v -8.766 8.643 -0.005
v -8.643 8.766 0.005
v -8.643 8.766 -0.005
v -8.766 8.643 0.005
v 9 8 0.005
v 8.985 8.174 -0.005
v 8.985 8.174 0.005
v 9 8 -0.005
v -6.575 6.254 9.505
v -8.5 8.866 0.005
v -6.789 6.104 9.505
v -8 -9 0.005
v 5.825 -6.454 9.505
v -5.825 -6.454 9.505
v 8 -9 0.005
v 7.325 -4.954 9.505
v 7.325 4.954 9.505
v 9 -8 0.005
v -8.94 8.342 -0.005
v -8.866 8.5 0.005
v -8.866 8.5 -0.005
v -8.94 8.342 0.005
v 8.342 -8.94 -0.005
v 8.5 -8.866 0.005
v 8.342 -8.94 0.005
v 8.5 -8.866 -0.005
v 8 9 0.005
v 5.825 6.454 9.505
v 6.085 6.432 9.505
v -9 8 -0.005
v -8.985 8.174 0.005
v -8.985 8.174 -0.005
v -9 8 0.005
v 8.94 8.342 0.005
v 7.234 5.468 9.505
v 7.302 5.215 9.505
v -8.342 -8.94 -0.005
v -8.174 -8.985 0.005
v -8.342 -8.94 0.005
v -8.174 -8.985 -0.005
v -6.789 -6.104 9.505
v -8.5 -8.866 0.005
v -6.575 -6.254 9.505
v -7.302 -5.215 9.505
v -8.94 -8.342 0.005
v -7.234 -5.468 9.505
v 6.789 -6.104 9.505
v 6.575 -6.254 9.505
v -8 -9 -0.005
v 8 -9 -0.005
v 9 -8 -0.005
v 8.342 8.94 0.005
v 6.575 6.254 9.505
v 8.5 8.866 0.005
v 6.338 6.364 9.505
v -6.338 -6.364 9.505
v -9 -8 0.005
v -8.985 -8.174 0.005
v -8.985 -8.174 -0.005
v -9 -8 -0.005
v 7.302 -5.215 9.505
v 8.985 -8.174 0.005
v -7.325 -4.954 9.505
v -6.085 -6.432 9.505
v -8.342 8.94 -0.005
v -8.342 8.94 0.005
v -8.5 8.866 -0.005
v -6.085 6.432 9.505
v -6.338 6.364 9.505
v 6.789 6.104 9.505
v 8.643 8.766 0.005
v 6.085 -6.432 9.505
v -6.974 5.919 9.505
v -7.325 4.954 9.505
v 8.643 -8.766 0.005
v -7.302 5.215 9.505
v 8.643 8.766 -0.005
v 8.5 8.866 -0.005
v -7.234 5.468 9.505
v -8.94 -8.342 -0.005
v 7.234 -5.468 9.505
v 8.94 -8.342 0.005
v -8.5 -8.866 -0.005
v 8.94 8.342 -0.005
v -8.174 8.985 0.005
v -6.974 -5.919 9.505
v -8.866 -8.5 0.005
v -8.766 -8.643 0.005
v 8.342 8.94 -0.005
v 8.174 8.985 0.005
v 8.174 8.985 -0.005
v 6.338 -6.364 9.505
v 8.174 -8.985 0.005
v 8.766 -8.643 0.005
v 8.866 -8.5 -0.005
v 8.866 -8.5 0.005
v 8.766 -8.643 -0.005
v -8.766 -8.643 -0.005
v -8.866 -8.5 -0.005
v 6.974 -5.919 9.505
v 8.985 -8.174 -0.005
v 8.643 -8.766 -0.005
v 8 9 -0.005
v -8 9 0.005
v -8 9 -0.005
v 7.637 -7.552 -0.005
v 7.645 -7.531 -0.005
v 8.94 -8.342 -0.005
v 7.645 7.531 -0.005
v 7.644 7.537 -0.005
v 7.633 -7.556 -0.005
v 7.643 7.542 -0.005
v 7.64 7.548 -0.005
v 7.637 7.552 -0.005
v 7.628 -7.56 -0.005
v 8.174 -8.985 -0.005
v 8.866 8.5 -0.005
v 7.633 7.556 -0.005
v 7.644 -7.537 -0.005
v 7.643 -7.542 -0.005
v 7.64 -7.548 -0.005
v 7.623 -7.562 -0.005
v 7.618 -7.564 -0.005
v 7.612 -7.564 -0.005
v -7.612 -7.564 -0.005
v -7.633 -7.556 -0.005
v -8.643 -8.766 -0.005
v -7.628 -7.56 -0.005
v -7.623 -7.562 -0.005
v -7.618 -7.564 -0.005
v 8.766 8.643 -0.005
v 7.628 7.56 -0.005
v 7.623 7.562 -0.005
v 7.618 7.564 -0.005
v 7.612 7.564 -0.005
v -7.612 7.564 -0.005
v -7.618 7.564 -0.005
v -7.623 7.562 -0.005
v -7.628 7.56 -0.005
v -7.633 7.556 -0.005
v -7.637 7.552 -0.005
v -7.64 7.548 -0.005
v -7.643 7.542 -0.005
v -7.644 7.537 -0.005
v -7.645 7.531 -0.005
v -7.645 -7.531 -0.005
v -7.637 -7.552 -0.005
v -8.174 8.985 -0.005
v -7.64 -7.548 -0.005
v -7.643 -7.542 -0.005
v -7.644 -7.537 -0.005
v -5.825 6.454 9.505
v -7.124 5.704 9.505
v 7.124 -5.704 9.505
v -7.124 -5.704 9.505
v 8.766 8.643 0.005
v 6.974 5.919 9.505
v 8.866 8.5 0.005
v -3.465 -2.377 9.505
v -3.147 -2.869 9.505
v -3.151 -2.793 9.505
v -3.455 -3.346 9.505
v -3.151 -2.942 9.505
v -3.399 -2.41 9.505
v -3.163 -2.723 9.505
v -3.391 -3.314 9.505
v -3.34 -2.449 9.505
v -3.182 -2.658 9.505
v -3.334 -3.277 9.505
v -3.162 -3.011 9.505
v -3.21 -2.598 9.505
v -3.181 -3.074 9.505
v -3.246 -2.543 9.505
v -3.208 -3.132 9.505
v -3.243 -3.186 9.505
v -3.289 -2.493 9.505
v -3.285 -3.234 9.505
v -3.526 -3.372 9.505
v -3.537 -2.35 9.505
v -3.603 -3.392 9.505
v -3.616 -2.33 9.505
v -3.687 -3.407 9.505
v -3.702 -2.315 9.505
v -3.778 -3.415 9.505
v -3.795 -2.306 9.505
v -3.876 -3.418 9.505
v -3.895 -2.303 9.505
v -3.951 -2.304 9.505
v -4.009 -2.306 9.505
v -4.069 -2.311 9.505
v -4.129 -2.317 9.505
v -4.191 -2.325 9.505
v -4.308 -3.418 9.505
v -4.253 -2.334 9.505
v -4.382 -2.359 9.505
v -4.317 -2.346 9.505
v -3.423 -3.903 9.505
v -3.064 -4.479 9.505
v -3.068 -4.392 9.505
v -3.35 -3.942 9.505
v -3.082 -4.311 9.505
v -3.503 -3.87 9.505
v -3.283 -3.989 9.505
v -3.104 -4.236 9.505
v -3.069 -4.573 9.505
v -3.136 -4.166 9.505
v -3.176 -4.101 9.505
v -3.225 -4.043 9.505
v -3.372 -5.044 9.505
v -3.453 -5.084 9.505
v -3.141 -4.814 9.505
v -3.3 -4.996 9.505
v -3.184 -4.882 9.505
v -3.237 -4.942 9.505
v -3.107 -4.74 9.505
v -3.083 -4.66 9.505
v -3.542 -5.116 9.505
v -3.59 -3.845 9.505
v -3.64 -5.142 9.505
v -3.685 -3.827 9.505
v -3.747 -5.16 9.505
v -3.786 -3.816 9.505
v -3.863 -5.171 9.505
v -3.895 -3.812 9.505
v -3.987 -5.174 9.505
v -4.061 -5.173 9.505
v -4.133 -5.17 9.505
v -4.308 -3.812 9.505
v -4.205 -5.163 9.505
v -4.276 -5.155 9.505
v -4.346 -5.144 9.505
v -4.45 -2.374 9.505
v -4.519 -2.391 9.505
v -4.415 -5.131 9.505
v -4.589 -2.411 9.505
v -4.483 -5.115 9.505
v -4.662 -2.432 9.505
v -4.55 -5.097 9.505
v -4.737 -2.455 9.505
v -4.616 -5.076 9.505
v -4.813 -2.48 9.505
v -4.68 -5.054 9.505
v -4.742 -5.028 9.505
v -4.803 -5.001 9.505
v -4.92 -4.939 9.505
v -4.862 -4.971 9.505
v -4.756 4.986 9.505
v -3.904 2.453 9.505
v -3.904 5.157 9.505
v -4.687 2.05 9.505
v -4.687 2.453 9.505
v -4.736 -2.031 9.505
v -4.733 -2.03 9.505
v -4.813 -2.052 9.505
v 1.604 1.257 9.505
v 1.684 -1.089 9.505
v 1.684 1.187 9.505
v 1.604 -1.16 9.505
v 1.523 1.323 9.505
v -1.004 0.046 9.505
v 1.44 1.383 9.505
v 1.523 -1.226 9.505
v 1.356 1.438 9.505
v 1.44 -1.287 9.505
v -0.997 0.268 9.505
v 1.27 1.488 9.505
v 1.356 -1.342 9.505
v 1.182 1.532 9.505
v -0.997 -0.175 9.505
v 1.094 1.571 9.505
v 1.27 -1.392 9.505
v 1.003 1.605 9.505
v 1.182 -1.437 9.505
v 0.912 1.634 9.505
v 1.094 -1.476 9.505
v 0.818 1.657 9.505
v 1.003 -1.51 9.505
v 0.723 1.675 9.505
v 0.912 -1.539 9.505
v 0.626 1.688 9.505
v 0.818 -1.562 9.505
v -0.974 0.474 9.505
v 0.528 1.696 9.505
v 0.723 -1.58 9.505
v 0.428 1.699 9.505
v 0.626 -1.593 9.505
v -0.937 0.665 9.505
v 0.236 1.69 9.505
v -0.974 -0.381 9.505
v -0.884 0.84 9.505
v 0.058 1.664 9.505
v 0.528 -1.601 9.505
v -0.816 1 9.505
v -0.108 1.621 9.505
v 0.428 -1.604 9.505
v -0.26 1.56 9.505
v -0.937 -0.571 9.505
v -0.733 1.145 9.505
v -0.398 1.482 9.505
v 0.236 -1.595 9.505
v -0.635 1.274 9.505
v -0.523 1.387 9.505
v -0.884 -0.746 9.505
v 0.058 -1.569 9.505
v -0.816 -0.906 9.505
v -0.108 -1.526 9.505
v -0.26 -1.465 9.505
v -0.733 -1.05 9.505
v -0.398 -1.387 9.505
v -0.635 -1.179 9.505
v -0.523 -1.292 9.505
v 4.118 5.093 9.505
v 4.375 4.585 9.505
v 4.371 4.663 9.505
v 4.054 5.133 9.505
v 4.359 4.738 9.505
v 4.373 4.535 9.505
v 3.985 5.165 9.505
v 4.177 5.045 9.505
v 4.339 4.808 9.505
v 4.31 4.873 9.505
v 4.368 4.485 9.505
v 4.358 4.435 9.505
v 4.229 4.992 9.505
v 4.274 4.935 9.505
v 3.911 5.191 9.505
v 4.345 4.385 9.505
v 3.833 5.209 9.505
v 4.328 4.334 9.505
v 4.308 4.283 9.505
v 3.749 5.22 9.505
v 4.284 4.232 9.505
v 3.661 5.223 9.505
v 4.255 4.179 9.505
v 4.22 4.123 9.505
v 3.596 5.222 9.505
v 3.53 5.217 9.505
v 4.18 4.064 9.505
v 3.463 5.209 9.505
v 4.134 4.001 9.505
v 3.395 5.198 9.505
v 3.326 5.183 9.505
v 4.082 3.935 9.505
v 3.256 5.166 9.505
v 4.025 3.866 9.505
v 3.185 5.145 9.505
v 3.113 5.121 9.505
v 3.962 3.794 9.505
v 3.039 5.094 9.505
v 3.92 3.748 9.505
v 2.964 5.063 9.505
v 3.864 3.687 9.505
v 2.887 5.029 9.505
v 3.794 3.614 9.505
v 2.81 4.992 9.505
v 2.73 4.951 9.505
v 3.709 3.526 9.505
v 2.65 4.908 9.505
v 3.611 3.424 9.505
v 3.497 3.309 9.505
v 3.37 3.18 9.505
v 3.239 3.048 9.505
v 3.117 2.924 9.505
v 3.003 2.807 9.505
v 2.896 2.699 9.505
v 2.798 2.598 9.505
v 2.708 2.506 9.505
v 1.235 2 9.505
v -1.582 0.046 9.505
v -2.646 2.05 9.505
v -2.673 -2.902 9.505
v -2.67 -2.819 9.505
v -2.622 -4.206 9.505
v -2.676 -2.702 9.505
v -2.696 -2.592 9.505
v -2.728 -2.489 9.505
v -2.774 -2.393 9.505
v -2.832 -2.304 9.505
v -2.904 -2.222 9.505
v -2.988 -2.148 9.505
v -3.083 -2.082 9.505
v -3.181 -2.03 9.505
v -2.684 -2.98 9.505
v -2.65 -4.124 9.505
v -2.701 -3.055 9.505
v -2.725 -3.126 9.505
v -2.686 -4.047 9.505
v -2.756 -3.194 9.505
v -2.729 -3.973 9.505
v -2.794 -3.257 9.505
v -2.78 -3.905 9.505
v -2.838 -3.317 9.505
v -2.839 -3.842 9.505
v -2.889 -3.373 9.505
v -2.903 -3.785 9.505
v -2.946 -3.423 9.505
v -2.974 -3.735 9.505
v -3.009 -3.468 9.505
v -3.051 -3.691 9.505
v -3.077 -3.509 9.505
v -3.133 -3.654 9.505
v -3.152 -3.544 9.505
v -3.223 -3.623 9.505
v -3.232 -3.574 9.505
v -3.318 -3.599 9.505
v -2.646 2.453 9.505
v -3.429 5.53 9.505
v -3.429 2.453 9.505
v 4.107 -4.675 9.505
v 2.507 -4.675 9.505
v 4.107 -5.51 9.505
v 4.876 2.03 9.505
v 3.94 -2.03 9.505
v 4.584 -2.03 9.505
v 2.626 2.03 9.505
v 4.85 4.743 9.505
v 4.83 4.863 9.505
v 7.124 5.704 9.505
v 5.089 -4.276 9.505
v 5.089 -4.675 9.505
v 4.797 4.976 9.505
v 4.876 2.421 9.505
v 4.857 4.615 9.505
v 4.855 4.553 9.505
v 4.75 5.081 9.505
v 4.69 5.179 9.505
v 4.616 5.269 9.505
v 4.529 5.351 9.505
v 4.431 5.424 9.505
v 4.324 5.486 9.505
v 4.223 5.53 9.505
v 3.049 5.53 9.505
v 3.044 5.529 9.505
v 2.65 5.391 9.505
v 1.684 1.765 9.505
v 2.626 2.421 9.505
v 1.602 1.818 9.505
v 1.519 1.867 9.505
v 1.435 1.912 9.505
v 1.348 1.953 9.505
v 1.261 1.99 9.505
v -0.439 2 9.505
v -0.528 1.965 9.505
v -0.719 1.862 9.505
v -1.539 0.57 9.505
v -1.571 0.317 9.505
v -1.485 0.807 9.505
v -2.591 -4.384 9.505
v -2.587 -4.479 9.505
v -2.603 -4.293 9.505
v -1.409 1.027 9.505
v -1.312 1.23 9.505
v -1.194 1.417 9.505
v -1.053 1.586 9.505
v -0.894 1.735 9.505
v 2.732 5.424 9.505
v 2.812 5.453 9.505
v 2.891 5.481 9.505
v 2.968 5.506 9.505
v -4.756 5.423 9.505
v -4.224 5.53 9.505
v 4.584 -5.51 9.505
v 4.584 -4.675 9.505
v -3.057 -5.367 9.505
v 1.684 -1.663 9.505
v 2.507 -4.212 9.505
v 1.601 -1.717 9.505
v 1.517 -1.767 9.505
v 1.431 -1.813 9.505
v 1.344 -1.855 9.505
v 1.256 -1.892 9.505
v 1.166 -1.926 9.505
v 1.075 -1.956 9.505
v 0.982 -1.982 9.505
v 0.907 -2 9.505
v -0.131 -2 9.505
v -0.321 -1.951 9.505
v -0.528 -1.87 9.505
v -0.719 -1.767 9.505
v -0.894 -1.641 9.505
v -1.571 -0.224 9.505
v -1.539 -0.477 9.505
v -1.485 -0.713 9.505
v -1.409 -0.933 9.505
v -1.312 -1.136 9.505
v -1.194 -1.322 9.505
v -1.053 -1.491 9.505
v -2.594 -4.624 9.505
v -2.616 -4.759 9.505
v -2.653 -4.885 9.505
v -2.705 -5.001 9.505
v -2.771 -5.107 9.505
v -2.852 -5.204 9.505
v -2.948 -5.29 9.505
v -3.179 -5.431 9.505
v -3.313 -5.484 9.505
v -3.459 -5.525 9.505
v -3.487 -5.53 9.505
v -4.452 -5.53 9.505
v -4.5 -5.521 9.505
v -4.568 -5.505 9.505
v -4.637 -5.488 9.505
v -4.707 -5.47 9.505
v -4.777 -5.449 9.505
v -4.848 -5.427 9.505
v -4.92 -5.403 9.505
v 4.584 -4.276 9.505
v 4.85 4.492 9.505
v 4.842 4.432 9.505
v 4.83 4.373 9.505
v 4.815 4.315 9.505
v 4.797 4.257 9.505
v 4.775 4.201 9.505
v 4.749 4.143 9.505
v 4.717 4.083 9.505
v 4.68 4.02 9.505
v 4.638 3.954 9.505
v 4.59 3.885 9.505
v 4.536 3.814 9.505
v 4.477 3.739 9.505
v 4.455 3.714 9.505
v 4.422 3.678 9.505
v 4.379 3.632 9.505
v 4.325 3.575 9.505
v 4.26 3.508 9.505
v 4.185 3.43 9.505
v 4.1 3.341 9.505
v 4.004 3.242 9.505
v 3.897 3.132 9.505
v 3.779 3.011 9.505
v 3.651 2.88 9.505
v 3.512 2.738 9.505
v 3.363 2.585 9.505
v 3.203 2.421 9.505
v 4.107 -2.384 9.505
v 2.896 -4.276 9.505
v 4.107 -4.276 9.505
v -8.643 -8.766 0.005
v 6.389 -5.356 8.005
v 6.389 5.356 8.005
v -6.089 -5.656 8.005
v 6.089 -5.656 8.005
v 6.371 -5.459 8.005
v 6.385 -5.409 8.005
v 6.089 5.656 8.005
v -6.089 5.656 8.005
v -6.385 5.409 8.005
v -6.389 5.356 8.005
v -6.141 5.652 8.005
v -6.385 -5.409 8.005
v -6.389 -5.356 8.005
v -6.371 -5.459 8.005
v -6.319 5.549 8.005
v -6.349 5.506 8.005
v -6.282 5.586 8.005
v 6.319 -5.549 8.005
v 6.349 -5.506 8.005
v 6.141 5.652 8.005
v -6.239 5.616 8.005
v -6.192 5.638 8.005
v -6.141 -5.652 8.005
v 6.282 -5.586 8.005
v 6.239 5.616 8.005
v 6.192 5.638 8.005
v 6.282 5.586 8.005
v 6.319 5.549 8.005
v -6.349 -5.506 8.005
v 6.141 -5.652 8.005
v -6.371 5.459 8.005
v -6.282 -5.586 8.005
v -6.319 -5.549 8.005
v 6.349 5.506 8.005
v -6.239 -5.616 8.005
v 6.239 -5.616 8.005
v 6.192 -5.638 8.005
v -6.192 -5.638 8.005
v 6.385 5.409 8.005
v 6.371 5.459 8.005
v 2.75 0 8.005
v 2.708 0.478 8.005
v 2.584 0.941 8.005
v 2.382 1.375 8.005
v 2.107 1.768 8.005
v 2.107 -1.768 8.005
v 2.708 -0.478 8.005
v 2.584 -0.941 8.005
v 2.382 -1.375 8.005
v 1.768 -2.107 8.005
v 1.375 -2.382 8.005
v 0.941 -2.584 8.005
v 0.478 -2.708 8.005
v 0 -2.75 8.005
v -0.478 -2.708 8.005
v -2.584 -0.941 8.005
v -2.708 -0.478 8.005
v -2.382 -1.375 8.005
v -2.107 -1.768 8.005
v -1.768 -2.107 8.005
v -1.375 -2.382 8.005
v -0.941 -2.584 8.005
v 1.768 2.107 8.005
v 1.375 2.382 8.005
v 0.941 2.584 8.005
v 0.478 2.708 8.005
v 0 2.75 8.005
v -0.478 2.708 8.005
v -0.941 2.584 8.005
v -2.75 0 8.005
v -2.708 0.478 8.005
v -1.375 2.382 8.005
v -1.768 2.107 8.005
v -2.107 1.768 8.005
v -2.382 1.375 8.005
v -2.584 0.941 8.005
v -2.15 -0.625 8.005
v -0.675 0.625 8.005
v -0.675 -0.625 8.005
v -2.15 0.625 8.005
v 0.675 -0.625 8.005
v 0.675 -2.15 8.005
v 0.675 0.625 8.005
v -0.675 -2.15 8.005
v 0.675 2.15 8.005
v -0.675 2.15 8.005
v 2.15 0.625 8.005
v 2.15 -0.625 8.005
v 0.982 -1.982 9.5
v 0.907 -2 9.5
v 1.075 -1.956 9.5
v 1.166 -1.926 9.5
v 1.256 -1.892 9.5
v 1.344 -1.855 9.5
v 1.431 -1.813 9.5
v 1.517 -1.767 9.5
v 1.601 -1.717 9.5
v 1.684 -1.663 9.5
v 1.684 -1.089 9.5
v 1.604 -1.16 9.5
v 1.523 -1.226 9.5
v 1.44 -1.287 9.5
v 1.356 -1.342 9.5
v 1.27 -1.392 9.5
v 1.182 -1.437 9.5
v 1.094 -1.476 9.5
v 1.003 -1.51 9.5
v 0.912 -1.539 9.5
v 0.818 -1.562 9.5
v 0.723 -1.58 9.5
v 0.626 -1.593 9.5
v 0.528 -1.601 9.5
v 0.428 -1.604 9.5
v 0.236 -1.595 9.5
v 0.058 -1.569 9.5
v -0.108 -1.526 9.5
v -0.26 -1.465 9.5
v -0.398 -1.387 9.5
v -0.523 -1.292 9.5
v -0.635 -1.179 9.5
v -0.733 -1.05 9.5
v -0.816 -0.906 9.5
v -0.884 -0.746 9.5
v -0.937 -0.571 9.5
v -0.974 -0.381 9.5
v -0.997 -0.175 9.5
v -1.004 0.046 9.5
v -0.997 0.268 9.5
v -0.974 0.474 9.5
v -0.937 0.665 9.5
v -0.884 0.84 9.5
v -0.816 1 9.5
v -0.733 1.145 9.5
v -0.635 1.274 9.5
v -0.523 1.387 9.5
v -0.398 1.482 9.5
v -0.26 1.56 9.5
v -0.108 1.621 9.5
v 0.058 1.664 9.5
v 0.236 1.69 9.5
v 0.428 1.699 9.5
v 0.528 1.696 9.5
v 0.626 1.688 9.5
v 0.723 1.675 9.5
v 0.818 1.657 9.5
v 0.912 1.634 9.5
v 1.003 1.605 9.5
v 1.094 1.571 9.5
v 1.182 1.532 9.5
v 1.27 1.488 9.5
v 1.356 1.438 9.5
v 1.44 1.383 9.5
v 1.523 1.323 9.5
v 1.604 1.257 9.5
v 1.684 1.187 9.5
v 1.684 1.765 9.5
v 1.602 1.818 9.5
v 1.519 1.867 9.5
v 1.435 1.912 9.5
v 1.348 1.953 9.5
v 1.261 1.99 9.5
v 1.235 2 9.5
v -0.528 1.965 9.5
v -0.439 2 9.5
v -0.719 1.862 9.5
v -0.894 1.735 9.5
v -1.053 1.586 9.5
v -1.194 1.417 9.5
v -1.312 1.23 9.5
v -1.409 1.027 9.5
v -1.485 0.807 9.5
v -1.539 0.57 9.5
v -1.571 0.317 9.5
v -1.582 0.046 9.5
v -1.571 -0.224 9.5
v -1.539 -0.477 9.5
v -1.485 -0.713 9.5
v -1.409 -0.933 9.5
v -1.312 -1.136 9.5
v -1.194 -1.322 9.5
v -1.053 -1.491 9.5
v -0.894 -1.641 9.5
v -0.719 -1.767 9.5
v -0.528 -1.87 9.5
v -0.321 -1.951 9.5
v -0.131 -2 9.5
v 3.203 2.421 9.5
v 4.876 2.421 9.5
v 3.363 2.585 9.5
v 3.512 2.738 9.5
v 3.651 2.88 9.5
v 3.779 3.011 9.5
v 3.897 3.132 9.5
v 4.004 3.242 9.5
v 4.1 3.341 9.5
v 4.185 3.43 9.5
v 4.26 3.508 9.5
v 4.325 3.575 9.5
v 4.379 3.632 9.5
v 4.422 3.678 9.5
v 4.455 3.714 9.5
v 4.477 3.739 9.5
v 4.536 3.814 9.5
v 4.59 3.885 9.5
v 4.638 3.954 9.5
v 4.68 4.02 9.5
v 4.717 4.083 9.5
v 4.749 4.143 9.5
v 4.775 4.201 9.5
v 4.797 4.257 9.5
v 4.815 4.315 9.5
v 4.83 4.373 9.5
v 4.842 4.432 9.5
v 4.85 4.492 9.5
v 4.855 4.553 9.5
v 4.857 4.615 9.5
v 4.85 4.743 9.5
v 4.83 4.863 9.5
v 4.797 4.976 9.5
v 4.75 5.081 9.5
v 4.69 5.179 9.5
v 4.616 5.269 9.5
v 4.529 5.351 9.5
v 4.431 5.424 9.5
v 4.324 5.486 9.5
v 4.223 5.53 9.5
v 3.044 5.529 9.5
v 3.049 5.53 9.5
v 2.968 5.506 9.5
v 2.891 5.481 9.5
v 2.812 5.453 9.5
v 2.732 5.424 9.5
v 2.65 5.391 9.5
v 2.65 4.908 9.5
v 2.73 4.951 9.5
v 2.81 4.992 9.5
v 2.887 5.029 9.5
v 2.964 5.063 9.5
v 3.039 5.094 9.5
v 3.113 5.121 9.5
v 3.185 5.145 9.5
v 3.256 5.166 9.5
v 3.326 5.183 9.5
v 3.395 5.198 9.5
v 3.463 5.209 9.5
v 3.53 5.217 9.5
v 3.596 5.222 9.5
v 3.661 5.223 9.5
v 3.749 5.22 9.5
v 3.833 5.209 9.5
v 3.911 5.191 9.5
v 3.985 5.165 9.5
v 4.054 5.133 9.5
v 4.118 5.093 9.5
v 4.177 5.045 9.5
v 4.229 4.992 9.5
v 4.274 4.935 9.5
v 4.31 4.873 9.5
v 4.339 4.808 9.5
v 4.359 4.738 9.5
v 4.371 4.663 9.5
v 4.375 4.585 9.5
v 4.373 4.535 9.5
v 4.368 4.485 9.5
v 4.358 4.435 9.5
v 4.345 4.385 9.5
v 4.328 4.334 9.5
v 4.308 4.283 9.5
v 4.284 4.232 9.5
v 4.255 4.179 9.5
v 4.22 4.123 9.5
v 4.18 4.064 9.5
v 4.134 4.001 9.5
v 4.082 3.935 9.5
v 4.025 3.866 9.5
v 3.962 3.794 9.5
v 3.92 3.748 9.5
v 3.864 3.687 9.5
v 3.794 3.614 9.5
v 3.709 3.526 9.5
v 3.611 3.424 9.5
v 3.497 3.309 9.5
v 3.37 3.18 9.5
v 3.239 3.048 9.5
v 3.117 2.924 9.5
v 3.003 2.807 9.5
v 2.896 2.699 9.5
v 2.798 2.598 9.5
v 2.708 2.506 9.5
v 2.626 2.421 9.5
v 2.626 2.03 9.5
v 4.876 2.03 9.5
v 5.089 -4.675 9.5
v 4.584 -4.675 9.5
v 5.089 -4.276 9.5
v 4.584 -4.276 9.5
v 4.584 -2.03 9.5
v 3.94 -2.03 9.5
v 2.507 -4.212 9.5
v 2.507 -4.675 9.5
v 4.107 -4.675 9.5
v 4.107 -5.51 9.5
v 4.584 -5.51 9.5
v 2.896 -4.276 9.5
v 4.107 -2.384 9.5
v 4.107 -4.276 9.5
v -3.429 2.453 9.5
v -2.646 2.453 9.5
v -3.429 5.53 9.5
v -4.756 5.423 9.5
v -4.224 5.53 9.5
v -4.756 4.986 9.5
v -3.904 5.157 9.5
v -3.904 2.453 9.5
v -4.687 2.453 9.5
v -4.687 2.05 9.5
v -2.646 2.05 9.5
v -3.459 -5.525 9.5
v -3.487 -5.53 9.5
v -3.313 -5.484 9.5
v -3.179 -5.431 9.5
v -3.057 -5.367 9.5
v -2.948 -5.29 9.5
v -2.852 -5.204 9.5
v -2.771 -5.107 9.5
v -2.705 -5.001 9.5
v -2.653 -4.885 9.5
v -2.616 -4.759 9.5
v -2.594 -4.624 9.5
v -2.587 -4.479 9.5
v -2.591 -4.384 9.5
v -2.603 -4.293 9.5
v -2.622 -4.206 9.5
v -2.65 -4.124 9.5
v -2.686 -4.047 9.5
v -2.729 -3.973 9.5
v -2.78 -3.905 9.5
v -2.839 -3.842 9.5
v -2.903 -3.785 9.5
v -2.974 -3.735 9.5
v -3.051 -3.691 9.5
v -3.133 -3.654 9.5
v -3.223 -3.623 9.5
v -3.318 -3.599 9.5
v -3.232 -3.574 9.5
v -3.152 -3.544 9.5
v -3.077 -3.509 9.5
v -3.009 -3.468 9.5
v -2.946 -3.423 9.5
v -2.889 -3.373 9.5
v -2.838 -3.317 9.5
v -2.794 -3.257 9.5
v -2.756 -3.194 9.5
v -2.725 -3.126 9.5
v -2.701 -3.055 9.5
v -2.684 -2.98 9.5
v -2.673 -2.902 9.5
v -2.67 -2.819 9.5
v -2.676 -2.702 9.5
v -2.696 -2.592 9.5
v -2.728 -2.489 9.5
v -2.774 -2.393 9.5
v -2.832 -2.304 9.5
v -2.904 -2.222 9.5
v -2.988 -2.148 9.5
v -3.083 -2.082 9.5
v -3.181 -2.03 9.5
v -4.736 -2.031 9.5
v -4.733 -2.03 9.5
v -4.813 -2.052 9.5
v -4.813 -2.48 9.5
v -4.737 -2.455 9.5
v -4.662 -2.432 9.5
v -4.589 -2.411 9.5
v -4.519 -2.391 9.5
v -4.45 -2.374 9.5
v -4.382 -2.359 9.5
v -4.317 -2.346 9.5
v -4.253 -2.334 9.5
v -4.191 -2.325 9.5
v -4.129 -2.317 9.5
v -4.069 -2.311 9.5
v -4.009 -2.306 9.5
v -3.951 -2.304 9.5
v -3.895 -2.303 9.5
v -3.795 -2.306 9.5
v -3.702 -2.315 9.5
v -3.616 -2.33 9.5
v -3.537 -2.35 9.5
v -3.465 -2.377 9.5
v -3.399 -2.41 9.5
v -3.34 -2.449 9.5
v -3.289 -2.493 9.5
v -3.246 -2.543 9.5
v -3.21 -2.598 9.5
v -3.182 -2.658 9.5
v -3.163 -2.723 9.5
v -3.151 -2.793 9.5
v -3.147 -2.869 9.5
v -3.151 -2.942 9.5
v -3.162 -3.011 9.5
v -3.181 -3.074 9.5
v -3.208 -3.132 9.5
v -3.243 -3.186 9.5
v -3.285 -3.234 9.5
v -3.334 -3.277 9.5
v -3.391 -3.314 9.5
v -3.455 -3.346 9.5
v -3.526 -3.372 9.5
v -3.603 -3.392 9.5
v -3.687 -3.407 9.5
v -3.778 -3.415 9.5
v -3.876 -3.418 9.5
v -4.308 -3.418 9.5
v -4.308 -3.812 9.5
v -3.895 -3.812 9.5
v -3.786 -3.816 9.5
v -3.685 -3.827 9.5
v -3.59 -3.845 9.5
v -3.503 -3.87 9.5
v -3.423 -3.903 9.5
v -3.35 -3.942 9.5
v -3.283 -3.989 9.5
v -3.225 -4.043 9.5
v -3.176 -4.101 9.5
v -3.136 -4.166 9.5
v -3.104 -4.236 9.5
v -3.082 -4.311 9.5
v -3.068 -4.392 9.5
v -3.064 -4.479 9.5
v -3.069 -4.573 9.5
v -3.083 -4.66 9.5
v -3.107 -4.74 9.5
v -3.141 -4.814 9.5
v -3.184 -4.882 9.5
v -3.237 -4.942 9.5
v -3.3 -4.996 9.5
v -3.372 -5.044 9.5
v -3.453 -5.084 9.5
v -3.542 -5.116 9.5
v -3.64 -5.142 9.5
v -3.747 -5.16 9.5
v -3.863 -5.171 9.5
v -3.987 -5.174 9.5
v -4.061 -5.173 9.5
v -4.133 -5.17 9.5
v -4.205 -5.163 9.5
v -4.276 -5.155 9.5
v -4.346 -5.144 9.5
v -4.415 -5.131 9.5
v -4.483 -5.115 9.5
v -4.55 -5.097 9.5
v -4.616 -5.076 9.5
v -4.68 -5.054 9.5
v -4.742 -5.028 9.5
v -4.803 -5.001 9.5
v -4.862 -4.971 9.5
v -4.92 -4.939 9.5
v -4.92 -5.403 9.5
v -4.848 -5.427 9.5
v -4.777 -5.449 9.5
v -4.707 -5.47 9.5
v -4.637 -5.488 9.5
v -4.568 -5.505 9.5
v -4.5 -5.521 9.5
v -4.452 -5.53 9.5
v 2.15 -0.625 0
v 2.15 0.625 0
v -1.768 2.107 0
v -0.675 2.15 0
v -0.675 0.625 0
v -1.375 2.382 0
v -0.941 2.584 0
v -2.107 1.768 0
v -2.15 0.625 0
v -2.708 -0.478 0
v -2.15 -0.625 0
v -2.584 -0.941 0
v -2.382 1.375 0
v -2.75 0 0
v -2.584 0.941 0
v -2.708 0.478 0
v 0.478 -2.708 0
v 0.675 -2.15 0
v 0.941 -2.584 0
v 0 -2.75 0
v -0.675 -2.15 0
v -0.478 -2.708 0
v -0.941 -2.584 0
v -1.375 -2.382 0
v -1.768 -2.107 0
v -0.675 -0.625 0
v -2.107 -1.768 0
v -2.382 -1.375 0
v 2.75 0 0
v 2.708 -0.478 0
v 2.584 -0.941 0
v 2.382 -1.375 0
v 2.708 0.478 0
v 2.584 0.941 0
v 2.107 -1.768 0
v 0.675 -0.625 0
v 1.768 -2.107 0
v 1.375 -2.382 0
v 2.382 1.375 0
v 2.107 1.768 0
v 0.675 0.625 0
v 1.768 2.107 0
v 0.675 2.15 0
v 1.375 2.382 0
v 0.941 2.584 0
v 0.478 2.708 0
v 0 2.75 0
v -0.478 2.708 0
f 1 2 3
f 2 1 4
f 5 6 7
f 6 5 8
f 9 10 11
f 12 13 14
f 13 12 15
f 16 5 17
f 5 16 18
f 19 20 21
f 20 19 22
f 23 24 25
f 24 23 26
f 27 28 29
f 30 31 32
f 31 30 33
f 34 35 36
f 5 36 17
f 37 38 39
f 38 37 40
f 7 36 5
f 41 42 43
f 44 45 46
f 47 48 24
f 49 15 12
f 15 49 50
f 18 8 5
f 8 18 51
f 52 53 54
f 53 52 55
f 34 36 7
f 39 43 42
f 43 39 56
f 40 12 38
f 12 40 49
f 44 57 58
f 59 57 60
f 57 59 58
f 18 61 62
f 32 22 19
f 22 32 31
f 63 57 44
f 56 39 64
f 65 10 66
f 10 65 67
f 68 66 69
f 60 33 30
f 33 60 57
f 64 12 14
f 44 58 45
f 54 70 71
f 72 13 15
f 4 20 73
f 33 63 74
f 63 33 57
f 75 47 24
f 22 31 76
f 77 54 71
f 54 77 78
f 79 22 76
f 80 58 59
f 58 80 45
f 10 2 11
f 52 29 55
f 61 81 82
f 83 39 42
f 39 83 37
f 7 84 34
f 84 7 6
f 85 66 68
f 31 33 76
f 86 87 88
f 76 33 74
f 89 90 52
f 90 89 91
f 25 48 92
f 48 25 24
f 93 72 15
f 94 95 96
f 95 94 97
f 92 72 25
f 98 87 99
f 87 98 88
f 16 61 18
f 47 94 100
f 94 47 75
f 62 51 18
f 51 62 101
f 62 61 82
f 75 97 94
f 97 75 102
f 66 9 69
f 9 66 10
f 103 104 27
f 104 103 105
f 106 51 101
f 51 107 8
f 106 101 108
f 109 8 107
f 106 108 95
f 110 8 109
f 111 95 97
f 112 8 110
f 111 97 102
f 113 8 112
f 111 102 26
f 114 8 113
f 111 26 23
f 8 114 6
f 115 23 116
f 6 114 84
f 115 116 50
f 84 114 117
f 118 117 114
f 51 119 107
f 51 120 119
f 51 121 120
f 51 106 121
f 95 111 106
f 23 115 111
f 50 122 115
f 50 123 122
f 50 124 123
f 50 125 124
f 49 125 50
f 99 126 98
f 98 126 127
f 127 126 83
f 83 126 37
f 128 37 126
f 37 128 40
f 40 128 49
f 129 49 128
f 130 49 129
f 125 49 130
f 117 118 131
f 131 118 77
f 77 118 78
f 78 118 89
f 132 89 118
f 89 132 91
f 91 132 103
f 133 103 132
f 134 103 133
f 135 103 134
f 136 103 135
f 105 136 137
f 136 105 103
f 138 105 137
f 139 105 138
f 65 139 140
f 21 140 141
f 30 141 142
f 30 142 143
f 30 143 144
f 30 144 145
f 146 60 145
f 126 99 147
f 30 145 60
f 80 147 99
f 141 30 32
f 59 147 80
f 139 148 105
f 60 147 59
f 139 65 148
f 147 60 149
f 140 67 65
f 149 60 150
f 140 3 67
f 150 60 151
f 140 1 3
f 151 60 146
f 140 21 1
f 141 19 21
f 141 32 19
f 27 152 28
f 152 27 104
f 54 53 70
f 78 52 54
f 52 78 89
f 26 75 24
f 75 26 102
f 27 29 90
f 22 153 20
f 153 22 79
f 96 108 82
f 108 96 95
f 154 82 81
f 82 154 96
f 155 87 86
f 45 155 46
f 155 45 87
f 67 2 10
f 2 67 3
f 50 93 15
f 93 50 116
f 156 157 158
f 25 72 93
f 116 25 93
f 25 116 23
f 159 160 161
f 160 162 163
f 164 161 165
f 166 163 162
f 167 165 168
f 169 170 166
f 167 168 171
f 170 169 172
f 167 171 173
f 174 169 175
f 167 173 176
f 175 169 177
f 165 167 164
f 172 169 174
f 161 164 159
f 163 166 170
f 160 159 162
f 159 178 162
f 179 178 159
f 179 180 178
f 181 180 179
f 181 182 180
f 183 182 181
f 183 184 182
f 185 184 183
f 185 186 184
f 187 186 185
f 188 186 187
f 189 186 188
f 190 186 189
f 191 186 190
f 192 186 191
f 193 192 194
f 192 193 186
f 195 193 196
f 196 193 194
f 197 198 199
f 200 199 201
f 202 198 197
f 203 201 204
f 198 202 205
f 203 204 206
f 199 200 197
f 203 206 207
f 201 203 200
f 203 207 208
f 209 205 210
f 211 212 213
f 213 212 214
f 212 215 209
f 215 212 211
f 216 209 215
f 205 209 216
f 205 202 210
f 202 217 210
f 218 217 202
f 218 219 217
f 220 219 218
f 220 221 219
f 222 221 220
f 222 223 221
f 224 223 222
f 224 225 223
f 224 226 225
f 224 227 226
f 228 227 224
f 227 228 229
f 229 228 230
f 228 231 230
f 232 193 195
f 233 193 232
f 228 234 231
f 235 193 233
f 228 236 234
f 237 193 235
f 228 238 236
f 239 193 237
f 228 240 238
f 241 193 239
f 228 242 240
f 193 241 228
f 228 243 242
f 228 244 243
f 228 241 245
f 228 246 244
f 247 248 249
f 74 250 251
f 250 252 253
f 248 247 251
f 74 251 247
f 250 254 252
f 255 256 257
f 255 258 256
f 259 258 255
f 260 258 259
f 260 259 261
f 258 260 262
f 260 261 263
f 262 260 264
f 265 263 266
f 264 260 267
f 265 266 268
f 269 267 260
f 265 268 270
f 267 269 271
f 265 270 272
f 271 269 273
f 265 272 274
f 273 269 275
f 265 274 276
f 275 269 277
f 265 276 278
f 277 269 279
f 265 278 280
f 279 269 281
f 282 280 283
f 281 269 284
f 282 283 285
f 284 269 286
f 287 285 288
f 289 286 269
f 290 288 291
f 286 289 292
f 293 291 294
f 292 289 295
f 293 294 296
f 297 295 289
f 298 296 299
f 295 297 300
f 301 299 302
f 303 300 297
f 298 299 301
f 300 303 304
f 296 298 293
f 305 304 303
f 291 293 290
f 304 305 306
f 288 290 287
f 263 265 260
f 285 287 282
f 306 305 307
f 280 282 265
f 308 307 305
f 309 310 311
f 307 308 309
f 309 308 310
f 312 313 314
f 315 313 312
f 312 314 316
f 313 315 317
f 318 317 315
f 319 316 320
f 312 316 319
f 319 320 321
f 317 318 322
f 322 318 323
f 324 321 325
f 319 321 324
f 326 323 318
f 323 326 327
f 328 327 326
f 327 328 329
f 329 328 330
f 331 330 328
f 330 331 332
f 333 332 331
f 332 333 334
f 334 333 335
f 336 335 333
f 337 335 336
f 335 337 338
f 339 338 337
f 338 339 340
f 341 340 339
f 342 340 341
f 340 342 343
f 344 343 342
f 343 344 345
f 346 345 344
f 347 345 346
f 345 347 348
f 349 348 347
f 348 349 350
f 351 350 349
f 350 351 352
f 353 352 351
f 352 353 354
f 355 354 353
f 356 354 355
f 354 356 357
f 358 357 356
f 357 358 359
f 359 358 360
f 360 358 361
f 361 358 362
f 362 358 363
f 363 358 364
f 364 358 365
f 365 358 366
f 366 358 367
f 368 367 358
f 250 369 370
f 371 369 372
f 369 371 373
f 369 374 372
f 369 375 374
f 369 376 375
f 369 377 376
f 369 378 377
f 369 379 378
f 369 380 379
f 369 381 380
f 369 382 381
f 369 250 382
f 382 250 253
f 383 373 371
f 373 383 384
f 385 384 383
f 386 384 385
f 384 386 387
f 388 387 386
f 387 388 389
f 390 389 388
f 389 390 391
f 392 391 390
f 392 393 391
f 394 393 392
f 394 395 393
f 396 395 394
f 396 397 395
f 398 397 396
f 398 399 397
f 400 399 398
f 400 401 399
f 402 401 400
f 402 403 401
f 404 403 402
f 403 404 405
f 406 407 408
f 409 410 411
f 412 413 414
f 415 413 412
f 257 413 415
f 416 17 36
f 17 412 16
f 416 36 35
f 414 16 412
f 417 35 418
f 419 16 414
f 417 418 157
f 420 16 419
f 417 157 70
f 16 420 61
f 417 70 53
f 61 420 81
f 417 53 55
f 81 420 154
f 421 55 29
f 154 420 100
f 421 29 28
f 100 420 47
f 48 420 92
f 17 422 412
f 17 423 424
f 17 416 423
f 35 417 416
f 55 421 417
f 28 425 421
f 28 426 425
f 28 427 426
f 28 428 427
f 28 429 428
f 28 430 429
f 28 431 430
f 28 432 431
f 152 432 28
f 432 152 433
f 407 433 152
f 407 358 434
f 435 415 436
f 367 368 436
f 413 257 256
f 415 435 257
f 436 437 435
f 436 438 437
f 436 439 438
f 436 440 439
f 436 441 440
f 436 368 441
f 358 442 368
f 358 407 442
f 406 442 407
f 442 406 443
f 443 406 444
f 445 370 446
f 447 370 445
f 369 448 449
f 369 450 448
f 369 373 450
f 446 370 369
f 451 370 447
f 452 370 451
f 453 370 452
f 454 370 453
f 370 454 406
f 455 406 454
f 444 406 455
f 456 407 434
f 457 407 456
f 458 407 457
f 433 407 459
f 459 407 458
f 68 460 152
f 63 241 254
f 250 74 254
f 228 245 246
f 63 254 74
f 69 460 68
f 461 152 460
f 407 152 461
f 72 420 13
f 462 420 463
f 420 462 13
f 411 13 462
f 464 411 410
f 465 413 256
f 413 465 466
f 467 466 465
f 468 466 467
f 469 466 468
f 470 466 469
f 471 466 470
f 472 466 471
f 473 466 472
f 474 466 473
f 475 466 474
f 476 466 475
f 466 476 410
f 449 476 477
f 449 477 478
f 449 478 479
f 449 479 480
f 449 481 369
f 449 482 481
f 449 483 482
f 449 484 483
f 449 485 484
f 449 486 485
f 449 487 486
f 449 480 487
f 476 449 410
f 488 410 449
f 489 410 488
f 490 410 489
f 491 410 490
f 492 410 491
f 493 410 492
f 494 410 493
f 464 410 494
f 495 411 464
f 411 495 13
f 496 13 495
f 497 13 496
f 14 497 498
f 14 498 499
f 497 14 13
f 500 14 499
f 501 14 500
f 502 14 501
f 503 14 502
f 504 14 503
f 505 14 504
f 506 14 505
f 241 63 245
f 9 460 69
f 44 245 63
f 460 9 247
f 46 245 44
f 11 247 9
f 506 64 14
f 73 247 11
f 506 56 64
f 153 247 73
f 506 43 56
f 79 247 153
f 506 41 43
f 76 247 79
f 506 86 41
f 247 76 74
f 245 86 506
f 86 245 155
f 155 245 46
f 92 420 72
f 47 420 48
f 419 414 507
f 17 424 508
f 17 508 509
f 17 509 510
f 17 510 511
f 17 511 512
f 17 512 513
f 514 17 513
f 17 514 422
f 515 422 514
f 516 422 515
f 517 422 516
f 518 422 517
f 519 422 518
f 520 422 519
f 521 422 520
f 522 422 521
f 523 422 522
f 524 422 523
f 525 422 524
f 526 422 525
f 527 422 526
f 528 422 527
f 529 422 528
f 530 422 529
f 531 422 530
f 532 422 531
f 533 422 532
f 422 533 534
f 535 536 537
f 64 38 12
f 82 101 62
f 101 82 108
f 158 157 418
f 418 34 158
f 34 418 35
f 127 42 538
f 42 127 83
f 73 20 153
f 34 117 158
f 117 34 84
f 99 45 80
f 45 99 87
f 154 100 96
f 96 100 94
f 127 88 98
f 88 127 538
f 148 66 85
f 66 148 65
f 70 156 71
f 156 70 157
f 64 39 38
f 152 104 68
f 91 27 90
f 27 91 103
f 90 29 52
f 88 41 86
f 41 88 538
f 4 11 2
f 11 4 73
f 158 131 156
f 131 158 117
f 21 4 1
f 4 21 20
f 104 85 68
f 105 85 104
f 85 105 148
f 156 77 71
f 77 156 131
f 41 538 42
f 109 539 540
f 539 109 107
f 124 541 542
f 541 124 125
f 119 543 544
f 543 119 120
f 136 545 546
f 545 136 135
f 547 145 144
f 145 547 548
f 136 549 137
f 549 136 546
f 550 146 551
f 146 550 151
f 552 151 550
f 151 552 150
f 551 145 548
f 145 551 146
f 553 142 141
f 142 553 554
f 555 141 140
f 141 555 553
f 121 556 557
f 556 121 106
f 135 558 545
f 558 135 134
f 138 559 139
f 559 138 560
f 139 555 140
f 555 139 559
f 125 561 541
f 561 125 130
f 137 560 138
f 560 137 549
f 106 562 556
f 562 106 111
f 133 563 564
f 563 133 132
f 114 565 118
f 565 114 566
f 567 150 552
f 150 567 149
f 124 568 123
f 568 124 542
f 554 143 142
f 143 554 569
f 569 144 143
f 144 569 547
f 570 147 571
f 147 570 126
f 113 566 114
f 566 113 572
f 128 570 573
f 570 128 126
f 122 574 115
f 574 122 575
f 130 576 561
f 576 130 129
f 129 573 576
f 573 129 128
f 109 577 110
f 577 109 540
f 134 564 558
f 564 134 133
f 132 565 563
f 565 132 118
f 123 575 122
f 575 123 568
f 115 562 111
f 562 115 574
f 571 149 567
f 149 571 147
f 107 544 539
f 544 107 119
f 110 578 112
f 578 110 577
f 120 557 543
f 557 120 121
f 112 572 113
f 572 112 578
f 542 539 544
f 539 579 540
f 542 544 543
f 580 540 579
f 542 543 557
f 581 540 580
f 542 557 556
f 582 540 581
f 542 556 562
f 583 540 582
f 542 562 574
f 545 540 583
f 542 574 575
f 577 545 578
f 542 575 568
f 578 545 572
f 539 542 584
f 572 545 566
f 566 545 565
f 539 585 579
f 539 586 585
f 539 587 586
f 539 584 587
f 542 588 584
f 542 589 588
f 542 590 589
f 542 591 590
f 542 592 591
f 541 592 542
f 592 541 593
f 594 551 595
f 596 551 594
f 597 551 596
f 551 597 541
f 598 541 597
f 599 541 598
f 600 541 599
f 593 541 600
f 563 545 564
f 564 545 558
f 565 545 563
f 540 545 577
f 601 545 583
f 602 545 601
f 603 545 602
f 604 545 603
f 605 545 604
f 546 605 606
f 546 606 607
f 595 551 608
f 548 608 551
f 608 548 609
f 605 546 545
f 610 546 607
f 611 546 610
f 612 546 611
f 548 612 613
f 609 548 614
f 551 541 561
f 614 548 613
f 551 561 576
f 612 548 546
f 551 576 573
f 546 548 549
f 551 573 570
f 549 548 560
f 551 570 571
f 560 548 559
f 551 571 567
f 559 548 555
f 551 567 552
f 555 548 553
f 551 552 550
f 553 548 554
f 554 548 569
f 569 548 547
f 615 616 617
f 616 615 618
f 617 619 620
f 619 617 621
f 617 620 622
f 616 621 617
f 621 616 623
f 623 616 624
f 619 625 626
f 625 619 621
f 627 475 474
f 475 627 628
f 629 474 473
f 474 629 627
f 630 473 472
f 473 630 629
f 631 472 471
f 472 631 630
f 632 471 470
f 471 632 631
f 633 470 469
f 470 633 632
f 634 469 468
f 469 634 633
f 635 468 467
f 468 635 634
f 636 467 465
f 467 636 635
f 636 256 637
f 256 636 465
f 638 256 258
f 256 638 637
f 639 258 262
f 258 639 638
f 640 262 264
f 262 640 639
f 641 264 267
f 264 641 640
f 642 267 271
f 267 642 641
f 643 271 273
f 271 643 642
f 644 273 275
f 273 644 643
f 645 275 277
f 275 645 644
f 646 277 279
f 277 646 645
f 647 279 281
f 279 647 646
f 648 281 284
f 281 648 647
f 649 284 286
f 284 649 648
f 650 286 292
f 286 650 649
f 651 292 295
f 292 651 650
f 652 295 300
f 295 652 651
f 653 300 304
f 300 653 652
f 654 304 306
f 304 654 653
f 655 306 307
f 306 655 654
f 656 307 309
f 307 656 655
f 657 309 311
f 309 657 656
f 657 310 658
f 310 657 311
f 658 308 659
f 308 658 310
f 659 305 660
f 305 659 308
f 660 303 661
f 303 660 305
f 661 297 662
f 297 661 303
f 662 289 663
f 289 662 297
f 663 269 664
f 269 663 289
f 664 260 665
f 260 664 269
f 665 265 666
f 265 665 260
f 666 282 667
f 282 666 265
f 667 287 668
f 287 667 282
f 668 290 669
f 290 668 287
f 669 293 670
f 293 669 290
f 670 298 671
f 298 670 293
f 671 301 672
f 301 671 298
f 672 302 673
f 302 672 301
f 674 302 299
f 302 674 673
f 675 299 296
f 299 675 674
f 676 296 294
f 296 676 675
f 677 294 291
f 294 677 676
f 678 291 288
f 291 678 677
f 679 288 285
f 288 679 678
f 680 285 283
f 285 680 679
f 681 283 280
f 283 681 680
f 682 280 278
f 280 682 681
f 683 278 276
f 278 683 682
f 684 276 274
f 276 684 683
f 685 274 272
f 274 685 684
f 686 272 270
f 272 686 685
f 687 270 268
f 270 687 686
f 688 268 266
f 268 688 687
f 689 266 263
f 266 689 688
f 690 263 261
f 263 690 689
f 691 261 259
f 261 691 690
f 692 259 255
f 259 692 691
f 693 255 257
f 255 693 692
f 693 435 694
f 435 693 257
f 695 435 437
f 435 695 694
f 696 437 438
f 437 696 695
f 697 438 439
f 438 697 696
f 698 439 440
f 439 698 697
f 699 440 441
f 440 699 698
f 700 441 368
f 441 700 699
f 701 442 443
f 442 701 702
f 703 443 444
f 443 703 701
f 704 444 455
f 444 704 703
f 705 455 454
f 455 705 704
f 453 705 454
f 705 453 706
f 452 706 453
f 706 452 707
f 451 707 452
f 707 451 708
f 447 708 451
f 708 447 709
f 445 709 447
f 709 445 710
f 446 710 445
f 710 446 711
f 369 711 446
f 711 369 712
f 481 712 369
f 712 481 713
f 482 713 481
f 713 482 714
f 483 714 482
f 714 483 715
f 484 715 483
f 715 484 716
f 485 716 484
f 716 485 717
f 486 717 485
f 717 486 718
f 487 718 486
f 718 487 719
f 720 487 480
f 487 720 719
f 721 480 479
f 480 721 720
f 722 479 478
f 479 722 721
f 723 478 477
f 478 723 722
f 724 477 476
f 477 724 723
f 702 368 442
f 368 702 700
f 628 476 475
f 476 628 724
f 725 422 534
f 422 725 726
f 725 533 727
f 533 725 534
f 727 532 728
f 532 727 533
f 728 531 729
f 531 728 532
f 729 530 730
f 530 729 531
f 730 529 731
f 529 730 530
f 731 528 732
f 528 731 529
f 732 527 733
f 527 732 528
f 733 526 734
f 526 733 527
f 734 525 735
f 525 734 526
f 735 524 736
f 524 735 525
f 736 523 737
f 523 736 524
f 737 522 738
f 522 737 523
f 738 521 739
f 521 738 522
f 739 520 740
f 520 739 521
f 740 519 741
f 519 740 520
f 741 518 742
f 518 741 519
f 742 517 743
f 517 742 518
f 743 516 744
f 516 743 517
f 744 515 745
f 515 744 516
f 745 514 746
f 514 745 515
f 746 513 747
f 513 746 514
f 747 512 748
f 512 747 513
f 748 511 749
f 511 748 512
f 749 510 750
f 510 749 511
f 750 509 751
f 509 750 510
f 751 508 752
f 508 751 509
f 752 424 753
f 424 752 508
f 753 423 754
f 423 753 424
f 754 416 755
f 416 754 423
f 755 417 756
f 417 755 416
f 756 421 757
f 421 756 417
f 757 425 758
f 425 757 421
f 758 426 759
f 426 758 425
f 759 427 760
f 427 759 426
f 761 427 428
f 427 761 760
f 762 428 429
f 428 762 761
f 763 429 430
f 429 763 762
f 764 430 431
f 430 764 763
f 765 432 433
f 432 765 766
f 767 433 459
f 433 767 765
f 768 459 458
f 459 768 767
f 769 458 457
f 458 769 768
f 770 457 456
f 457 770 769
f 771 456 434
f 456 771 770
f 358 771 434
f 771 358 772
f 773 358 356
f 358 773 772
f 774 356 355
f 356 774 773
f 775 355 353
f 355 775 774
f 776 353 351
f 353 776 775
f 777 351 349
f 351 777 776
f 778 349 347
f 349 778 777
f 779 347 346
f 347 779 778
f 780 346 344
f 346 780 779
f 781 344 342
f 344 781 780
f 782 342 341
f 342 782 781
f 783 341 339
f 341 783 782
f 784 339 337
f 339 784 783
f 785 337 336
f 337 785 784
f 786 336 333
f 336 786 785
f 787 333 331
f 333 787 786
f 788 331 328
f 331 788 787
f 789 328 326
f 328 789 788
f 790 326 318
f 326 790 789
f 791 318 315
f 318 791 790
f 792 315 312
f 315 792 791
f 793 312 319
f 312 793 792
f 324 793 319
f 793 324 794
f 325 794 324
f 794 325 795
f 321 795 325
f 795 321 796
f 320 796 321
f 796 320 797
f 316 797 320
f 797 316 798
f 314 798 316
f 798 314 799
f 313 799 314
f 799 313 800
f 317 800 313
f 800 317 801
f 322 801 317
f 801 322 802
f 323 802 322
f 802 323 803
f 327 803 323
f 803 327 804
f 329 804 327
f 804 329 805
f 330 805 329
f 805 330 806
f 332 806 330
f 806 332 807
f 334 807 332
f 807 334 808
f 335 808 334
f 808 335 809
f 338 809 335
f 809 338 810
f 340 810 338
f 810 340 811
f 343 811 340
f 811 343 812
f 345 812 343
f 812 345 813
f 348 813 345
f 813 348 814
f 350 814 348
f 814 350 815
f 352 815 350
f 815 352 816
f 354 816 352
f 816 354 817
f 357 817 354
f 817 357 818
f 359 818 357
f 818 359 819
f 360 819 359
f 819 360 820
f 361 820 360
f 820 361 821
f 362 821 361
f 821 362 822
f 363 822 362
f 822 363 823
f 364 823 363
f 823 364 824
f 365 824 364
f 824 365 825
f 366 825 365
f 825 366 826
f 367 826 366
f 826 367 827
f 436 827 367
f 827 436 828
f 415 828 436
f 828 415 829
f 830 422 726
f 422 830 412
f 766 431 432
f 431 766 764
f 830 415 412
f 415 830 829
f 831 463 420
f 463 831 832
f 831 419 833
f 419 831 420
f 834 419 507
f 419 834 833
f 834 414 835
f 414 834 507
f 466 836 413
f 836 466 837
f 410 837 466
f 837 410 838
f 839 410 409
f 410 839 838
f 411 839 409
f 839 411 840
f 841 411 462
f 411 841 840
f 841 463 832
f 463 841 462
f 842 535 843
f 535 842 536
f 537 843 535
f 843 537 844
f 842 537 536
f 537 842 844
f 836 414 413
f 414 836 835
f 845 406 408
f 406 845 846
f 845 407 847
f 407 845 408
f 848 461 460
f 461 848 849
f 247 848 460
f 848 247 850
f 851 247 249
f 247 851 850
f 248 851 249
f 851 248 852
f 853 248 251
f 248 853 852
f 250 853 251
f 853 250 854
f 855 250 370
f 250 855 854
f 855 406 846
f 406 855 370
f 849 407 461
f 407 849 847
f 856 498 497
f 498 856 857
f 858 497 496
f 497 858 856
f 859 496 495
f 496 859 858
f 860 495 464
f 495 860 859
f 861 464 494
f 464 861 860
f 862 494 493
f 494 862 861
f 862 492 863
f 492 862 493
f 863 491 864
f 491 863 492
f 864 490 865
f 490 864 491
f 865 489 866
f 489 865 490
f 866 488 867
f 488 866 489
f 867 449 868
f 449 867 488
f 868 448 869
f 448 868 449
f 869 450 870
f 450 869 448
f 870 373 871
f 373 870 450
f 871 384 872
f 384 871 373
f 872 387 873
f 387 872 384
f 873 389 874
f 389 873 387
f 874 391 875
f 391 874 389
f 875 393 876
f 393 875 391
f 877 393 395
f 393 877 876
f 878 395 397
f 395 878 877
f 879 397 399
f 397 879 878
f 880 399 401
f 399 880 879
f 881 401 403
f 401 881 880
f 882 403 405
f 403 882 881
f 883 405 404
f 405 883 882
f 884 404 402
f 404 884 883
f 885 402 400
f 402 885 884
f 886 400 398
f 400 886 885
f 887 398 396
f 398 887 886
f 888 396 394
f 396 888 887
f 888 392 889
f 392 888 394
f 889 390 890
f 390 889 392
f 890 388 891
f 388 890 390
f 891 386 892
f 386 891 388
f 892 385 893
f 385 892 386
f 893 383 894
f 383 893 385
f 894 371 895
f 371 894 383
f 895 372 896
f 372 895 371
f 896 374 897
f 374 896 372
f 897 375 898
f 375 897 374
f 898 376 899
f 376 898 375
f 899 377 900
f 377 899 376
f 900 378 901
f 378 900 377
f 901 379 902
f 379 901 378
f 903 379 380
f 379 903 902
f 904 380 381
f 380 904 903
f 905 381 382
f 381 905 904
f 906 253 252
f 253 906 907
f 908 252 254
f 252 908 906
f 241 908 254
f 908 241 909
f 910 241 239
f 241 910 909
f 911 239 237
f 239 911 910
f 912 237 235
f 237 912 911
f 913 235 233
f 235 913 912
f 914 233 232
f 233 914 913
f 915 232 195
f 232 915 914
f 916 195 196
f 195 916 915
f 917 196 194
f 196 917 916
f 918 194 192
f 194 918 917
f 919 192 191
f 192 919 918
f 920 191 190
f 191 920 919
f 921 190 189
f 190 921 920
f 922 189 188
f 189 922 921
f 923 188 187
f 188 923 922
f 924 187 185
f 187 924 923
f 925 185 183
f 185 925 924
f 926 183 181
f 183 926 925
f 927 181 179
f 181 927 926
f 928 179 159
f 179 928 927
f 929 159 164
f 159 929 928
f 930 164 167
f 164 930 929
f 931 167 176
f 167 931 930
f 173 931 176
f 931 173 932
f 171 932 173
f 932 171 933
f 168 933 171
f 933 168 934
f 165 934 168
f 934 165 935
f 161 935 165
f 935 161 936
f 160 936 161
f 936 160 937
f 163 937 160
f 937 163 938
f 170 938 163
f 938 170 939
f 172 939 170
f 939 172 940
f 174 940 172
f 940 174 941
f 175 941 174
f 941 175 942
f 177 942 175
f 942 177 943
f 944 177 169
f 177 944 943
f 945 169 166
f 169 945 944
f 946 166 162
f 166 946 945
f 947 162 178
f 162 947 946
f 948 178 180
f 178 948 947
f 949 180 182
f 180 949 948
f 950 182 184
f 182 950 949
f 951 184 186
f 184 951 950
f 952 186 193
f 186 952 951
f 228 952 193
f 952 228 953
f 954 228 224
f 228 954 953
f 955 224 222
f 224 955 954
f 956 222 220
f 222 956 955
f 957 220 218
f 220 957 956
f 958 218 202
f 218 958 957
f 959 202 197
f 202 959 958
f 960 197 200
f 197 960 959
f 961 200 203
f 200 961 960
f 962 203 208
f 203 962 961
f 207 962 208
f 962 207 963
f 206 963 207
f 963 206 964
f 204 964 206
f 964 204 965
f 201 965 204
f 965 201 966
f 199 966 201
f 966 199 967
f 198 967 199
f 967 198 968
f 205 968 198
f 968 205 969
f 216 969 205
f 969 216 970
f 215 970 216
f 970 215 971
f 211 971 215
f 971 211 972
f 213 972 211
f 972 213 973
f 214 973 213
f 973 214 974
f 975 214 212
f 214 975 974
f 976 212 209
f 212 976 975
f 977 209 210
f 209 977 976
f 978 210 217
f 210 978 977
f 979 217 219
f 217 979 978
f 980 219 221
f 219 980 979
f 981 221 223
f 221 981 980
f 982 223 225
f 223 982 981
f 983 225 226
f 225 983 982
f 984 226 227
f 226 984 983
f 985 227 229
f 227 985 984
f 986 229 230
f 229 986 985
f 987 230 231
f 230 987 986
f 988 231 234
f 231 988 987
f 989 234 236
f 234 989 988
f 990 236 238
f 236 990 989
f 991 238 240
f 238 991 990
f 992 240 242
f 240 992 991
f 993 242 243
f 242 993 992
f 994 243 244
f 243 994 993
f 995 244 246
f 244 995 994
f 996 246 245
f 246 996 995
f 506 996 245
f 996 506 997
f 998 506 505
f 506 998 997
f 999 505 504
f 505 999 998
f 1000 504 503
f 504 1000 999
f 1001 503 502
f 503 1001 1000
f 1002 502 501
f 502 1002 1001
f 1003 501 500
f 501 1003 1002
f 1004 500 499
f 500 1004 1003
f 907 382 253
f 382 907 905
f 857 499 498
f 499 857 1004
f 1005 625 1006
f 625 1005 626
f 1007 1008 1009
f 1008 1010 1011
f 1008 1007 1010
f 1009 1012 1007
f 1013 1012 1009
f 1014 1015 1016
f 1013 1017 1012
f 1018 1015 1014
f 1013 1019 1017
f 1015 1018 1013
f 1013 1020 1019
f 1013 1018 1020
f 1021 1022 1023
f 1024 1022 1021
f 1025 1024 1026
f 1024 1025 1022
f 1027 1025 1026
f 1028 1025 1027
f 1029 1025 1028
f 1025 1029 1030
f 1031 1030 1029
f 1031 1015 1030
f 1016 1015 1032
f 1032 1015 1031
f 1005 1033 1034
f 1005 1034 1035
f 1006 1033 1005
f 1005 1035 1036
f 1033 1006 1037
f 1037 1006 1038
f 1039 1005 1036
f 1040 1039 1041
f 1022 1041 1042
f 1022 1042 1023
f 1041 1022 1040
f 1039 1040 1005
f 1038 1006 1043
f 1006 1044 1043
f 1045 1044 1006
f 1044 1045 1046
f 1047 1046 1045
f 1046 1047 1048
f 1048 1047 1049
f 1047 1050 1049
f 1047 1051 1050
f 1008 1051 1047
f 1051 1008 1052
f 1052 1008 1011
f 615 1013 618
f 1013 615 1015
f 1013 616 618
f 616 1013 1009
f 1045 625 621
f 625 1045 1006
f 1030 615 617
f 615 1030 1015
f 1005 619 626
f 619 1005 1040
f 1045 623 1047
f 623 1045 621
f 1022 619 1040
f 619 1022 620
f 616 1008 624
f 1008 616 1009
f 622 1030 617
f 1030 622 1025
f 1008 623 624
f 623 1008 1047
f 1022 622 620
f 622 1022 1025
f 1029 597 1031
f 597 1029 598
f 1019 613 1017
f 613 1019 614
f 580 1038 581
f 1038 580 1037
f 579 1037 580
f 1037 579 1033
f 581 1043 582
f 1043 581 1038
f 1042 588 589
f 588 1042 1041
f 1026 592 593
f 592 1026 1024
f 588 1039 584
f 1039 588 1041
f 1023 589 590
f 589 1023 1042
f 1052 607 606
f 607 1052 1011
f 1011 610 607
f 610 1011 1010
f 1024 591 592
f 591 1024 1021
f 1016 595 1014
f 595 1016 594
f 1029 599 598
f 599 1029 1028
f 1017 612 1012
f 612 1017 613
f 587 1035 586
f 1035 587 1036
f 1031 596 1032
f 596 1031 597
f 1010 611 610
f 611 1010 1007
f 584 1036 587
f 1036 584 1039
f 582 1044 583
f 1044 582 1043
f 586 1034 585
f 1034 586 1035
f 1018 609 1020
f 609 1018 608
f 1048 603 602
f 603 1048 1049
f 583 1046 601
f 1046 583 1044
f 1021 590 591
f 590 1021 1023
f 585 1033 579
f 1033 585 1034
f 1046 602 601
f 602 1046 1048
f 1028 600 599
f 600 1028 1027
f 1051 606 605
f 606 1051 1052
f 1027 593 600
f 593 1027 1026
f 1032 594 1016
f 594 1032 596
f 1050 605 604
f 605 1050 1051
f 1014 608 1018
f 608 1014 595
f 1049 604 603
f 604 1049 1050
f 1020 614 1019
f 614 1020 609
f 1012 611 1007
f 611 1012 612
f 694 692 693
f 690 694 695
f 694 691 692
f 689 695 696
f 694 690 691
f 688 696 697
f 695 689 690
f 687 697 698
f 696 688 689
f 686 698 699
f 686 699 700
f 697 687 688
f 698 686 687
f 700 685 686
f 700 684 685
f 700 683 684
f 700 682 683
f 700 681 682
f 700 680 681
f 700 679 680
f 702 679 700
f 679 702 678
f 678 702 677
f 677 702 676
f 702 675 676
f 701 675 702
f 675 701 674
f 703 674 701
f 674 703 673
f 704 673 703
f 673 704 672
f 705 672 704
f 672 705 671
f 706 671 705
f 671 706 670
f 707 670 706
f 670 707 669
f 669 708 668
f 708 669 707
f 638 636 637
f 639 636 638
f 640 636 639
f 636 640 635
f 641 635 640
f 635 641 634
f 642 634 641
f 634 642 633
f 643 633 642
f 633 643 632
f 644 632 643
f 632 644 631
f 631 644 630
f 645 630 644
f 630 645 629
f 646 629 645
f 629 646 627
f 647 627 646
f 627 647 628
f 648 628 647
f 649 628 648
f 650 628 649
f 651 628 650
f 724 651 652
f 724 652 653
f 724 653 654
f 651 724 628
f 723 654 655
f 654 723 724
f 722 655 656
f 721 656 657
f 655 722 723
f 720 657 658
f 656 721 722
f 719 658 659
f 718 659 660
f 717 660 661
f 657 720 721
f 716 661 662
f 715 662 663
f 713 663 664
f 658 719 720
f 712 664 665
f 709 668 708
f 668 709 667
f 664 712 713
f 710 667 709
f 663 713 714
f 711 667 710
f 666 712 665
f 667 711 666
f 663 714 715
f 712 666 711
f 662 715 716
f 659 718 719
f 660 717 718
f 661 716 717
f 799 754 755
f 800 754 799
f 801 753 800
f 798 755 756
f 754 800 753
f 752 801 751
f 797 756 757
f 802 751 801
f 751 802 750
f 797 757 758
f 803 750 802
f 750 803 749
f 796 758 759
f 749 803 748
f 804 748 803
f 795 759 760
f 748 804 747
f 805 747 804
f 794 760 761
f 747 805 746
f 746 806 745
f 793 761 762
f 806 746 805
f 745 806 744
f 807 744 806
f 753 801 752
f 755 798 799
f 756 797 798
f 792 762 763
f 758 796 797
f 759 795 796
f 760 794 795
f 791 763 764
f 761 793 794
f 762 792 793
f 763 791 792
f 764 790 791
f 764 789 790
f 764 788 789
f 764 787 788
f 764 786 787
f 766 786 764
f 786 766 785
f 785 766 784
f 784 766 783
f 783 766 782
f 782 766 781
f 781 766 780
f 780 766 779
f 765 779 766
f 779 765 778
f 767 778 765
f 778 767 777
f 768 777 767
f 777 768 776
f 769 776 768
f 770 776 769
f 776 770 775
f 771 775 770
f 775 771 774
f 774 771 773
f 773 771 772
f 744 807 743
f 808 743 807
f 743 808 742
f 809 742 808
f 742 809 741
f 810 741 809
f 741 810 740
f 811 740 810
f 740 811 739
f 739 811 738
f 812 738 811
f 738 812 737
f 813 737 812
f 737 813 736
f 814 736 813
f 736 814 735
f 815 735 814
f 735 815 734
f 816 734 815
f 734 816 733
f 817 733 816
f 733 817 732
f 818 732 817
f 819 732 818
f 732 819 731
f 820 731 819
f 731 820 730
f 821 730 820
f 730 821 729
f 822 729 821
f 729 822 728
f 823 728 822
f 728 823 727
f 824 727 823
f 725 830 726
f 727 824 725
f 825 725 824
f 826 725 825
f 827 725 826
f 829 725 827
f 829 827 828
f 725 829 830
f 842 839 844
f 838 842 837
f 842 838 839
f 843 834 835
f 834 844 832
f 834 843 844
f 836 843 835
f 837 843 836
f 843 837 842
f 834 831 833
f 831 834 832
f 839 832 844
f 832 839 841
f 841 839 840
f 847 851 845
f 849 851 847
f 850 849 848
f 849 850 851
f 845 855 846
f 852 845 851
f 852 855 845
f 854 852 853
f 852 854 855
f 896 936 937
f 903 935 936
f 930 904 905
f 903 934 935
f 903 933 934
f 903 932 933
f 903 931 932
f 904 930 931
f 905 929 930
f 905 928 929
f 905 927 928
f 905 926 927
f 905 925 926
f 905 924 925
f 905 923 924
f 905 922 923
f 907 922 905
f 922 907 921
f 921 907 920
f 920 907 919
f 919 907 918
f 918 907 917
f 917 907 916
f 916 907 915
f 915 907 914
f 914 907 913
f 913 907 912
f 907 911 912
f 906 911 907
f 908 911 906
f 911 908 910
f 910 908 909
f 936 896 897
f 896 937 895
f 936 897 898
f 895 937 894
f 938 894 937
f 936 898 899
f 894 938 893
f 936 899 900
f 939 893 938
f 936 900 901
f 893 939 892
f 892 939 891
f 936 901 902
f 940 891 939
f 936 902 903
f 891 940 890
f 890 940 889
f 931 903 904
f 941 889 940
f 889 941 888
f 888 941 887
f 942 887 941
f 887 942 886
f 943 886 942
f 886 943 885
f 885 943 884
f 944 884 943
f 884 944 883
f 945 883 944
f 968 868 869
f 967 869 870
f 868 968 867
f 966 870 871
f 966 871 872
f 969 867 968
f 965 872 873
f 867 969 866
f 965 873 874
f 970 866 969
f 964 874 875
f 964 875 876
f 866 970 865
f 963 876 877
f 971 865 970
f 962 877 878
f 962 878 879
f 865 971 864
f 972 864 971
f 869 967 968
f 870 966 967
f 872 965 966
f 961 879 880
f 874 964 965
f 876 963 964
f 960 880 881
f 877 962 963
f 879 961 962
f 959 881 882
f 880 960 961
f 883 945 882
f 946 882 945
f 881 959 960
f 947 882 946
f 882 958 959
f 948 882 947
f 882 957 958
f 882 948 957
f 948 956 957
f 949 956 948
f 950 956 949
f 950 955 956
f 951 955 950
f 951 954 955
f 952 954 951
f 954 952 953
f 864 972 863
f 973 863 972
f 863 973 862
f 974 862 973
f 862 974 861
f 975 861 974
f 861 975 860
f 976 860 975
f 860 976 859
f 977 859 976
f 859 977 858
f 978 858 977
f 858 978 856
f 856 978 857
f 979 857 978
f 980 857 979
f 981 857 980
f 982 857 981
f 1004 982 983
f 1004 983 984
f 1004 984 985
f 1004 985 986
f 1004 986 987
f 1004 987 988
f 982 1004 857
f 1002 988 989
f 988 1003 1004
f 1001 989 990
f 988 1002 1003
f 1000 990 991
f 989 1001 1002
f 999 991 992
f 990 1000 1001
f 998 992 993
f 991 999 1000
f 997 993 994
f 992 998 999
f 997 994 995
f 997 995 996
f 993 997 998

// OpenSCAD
export_target = "preview";

include <common/custom-shell-params.scad>

user_legend_enabled = true;
user_legend_text = "C";
user_legend_width = 5;
user_legend_depth = 4;

user_top_legend_left_top_enabled = true;
user_top_legend_left_top_text = "1";
user_top_legend_left_top_width = 5;
user_top_legend_left_top_depth = 3.5;

user_top_legend_right_top_enabled = true;
user_top_legend_right_top_text = "2";
user_top_legend_right_top_width = 5;
user_top_legend_right_top_depth = 3.5;

user_top_legend_left_bottom_enabled = true;
user_top_legend_left_bottom_text = "3";
user_top_legend_left_bottom_width = 5;
user_top_legend_left_bottom_depth = 3.5;

user_top_legend_right_bottom_enabled = true;
user_top_legend_right_bottom_text = "4";
user_top_legend_right_bottom_width = 5;
user_top_legend_right_bottom_depth = 3.5;

user_homing_bar_enabled = false;

include <../base/keycap.scad>
